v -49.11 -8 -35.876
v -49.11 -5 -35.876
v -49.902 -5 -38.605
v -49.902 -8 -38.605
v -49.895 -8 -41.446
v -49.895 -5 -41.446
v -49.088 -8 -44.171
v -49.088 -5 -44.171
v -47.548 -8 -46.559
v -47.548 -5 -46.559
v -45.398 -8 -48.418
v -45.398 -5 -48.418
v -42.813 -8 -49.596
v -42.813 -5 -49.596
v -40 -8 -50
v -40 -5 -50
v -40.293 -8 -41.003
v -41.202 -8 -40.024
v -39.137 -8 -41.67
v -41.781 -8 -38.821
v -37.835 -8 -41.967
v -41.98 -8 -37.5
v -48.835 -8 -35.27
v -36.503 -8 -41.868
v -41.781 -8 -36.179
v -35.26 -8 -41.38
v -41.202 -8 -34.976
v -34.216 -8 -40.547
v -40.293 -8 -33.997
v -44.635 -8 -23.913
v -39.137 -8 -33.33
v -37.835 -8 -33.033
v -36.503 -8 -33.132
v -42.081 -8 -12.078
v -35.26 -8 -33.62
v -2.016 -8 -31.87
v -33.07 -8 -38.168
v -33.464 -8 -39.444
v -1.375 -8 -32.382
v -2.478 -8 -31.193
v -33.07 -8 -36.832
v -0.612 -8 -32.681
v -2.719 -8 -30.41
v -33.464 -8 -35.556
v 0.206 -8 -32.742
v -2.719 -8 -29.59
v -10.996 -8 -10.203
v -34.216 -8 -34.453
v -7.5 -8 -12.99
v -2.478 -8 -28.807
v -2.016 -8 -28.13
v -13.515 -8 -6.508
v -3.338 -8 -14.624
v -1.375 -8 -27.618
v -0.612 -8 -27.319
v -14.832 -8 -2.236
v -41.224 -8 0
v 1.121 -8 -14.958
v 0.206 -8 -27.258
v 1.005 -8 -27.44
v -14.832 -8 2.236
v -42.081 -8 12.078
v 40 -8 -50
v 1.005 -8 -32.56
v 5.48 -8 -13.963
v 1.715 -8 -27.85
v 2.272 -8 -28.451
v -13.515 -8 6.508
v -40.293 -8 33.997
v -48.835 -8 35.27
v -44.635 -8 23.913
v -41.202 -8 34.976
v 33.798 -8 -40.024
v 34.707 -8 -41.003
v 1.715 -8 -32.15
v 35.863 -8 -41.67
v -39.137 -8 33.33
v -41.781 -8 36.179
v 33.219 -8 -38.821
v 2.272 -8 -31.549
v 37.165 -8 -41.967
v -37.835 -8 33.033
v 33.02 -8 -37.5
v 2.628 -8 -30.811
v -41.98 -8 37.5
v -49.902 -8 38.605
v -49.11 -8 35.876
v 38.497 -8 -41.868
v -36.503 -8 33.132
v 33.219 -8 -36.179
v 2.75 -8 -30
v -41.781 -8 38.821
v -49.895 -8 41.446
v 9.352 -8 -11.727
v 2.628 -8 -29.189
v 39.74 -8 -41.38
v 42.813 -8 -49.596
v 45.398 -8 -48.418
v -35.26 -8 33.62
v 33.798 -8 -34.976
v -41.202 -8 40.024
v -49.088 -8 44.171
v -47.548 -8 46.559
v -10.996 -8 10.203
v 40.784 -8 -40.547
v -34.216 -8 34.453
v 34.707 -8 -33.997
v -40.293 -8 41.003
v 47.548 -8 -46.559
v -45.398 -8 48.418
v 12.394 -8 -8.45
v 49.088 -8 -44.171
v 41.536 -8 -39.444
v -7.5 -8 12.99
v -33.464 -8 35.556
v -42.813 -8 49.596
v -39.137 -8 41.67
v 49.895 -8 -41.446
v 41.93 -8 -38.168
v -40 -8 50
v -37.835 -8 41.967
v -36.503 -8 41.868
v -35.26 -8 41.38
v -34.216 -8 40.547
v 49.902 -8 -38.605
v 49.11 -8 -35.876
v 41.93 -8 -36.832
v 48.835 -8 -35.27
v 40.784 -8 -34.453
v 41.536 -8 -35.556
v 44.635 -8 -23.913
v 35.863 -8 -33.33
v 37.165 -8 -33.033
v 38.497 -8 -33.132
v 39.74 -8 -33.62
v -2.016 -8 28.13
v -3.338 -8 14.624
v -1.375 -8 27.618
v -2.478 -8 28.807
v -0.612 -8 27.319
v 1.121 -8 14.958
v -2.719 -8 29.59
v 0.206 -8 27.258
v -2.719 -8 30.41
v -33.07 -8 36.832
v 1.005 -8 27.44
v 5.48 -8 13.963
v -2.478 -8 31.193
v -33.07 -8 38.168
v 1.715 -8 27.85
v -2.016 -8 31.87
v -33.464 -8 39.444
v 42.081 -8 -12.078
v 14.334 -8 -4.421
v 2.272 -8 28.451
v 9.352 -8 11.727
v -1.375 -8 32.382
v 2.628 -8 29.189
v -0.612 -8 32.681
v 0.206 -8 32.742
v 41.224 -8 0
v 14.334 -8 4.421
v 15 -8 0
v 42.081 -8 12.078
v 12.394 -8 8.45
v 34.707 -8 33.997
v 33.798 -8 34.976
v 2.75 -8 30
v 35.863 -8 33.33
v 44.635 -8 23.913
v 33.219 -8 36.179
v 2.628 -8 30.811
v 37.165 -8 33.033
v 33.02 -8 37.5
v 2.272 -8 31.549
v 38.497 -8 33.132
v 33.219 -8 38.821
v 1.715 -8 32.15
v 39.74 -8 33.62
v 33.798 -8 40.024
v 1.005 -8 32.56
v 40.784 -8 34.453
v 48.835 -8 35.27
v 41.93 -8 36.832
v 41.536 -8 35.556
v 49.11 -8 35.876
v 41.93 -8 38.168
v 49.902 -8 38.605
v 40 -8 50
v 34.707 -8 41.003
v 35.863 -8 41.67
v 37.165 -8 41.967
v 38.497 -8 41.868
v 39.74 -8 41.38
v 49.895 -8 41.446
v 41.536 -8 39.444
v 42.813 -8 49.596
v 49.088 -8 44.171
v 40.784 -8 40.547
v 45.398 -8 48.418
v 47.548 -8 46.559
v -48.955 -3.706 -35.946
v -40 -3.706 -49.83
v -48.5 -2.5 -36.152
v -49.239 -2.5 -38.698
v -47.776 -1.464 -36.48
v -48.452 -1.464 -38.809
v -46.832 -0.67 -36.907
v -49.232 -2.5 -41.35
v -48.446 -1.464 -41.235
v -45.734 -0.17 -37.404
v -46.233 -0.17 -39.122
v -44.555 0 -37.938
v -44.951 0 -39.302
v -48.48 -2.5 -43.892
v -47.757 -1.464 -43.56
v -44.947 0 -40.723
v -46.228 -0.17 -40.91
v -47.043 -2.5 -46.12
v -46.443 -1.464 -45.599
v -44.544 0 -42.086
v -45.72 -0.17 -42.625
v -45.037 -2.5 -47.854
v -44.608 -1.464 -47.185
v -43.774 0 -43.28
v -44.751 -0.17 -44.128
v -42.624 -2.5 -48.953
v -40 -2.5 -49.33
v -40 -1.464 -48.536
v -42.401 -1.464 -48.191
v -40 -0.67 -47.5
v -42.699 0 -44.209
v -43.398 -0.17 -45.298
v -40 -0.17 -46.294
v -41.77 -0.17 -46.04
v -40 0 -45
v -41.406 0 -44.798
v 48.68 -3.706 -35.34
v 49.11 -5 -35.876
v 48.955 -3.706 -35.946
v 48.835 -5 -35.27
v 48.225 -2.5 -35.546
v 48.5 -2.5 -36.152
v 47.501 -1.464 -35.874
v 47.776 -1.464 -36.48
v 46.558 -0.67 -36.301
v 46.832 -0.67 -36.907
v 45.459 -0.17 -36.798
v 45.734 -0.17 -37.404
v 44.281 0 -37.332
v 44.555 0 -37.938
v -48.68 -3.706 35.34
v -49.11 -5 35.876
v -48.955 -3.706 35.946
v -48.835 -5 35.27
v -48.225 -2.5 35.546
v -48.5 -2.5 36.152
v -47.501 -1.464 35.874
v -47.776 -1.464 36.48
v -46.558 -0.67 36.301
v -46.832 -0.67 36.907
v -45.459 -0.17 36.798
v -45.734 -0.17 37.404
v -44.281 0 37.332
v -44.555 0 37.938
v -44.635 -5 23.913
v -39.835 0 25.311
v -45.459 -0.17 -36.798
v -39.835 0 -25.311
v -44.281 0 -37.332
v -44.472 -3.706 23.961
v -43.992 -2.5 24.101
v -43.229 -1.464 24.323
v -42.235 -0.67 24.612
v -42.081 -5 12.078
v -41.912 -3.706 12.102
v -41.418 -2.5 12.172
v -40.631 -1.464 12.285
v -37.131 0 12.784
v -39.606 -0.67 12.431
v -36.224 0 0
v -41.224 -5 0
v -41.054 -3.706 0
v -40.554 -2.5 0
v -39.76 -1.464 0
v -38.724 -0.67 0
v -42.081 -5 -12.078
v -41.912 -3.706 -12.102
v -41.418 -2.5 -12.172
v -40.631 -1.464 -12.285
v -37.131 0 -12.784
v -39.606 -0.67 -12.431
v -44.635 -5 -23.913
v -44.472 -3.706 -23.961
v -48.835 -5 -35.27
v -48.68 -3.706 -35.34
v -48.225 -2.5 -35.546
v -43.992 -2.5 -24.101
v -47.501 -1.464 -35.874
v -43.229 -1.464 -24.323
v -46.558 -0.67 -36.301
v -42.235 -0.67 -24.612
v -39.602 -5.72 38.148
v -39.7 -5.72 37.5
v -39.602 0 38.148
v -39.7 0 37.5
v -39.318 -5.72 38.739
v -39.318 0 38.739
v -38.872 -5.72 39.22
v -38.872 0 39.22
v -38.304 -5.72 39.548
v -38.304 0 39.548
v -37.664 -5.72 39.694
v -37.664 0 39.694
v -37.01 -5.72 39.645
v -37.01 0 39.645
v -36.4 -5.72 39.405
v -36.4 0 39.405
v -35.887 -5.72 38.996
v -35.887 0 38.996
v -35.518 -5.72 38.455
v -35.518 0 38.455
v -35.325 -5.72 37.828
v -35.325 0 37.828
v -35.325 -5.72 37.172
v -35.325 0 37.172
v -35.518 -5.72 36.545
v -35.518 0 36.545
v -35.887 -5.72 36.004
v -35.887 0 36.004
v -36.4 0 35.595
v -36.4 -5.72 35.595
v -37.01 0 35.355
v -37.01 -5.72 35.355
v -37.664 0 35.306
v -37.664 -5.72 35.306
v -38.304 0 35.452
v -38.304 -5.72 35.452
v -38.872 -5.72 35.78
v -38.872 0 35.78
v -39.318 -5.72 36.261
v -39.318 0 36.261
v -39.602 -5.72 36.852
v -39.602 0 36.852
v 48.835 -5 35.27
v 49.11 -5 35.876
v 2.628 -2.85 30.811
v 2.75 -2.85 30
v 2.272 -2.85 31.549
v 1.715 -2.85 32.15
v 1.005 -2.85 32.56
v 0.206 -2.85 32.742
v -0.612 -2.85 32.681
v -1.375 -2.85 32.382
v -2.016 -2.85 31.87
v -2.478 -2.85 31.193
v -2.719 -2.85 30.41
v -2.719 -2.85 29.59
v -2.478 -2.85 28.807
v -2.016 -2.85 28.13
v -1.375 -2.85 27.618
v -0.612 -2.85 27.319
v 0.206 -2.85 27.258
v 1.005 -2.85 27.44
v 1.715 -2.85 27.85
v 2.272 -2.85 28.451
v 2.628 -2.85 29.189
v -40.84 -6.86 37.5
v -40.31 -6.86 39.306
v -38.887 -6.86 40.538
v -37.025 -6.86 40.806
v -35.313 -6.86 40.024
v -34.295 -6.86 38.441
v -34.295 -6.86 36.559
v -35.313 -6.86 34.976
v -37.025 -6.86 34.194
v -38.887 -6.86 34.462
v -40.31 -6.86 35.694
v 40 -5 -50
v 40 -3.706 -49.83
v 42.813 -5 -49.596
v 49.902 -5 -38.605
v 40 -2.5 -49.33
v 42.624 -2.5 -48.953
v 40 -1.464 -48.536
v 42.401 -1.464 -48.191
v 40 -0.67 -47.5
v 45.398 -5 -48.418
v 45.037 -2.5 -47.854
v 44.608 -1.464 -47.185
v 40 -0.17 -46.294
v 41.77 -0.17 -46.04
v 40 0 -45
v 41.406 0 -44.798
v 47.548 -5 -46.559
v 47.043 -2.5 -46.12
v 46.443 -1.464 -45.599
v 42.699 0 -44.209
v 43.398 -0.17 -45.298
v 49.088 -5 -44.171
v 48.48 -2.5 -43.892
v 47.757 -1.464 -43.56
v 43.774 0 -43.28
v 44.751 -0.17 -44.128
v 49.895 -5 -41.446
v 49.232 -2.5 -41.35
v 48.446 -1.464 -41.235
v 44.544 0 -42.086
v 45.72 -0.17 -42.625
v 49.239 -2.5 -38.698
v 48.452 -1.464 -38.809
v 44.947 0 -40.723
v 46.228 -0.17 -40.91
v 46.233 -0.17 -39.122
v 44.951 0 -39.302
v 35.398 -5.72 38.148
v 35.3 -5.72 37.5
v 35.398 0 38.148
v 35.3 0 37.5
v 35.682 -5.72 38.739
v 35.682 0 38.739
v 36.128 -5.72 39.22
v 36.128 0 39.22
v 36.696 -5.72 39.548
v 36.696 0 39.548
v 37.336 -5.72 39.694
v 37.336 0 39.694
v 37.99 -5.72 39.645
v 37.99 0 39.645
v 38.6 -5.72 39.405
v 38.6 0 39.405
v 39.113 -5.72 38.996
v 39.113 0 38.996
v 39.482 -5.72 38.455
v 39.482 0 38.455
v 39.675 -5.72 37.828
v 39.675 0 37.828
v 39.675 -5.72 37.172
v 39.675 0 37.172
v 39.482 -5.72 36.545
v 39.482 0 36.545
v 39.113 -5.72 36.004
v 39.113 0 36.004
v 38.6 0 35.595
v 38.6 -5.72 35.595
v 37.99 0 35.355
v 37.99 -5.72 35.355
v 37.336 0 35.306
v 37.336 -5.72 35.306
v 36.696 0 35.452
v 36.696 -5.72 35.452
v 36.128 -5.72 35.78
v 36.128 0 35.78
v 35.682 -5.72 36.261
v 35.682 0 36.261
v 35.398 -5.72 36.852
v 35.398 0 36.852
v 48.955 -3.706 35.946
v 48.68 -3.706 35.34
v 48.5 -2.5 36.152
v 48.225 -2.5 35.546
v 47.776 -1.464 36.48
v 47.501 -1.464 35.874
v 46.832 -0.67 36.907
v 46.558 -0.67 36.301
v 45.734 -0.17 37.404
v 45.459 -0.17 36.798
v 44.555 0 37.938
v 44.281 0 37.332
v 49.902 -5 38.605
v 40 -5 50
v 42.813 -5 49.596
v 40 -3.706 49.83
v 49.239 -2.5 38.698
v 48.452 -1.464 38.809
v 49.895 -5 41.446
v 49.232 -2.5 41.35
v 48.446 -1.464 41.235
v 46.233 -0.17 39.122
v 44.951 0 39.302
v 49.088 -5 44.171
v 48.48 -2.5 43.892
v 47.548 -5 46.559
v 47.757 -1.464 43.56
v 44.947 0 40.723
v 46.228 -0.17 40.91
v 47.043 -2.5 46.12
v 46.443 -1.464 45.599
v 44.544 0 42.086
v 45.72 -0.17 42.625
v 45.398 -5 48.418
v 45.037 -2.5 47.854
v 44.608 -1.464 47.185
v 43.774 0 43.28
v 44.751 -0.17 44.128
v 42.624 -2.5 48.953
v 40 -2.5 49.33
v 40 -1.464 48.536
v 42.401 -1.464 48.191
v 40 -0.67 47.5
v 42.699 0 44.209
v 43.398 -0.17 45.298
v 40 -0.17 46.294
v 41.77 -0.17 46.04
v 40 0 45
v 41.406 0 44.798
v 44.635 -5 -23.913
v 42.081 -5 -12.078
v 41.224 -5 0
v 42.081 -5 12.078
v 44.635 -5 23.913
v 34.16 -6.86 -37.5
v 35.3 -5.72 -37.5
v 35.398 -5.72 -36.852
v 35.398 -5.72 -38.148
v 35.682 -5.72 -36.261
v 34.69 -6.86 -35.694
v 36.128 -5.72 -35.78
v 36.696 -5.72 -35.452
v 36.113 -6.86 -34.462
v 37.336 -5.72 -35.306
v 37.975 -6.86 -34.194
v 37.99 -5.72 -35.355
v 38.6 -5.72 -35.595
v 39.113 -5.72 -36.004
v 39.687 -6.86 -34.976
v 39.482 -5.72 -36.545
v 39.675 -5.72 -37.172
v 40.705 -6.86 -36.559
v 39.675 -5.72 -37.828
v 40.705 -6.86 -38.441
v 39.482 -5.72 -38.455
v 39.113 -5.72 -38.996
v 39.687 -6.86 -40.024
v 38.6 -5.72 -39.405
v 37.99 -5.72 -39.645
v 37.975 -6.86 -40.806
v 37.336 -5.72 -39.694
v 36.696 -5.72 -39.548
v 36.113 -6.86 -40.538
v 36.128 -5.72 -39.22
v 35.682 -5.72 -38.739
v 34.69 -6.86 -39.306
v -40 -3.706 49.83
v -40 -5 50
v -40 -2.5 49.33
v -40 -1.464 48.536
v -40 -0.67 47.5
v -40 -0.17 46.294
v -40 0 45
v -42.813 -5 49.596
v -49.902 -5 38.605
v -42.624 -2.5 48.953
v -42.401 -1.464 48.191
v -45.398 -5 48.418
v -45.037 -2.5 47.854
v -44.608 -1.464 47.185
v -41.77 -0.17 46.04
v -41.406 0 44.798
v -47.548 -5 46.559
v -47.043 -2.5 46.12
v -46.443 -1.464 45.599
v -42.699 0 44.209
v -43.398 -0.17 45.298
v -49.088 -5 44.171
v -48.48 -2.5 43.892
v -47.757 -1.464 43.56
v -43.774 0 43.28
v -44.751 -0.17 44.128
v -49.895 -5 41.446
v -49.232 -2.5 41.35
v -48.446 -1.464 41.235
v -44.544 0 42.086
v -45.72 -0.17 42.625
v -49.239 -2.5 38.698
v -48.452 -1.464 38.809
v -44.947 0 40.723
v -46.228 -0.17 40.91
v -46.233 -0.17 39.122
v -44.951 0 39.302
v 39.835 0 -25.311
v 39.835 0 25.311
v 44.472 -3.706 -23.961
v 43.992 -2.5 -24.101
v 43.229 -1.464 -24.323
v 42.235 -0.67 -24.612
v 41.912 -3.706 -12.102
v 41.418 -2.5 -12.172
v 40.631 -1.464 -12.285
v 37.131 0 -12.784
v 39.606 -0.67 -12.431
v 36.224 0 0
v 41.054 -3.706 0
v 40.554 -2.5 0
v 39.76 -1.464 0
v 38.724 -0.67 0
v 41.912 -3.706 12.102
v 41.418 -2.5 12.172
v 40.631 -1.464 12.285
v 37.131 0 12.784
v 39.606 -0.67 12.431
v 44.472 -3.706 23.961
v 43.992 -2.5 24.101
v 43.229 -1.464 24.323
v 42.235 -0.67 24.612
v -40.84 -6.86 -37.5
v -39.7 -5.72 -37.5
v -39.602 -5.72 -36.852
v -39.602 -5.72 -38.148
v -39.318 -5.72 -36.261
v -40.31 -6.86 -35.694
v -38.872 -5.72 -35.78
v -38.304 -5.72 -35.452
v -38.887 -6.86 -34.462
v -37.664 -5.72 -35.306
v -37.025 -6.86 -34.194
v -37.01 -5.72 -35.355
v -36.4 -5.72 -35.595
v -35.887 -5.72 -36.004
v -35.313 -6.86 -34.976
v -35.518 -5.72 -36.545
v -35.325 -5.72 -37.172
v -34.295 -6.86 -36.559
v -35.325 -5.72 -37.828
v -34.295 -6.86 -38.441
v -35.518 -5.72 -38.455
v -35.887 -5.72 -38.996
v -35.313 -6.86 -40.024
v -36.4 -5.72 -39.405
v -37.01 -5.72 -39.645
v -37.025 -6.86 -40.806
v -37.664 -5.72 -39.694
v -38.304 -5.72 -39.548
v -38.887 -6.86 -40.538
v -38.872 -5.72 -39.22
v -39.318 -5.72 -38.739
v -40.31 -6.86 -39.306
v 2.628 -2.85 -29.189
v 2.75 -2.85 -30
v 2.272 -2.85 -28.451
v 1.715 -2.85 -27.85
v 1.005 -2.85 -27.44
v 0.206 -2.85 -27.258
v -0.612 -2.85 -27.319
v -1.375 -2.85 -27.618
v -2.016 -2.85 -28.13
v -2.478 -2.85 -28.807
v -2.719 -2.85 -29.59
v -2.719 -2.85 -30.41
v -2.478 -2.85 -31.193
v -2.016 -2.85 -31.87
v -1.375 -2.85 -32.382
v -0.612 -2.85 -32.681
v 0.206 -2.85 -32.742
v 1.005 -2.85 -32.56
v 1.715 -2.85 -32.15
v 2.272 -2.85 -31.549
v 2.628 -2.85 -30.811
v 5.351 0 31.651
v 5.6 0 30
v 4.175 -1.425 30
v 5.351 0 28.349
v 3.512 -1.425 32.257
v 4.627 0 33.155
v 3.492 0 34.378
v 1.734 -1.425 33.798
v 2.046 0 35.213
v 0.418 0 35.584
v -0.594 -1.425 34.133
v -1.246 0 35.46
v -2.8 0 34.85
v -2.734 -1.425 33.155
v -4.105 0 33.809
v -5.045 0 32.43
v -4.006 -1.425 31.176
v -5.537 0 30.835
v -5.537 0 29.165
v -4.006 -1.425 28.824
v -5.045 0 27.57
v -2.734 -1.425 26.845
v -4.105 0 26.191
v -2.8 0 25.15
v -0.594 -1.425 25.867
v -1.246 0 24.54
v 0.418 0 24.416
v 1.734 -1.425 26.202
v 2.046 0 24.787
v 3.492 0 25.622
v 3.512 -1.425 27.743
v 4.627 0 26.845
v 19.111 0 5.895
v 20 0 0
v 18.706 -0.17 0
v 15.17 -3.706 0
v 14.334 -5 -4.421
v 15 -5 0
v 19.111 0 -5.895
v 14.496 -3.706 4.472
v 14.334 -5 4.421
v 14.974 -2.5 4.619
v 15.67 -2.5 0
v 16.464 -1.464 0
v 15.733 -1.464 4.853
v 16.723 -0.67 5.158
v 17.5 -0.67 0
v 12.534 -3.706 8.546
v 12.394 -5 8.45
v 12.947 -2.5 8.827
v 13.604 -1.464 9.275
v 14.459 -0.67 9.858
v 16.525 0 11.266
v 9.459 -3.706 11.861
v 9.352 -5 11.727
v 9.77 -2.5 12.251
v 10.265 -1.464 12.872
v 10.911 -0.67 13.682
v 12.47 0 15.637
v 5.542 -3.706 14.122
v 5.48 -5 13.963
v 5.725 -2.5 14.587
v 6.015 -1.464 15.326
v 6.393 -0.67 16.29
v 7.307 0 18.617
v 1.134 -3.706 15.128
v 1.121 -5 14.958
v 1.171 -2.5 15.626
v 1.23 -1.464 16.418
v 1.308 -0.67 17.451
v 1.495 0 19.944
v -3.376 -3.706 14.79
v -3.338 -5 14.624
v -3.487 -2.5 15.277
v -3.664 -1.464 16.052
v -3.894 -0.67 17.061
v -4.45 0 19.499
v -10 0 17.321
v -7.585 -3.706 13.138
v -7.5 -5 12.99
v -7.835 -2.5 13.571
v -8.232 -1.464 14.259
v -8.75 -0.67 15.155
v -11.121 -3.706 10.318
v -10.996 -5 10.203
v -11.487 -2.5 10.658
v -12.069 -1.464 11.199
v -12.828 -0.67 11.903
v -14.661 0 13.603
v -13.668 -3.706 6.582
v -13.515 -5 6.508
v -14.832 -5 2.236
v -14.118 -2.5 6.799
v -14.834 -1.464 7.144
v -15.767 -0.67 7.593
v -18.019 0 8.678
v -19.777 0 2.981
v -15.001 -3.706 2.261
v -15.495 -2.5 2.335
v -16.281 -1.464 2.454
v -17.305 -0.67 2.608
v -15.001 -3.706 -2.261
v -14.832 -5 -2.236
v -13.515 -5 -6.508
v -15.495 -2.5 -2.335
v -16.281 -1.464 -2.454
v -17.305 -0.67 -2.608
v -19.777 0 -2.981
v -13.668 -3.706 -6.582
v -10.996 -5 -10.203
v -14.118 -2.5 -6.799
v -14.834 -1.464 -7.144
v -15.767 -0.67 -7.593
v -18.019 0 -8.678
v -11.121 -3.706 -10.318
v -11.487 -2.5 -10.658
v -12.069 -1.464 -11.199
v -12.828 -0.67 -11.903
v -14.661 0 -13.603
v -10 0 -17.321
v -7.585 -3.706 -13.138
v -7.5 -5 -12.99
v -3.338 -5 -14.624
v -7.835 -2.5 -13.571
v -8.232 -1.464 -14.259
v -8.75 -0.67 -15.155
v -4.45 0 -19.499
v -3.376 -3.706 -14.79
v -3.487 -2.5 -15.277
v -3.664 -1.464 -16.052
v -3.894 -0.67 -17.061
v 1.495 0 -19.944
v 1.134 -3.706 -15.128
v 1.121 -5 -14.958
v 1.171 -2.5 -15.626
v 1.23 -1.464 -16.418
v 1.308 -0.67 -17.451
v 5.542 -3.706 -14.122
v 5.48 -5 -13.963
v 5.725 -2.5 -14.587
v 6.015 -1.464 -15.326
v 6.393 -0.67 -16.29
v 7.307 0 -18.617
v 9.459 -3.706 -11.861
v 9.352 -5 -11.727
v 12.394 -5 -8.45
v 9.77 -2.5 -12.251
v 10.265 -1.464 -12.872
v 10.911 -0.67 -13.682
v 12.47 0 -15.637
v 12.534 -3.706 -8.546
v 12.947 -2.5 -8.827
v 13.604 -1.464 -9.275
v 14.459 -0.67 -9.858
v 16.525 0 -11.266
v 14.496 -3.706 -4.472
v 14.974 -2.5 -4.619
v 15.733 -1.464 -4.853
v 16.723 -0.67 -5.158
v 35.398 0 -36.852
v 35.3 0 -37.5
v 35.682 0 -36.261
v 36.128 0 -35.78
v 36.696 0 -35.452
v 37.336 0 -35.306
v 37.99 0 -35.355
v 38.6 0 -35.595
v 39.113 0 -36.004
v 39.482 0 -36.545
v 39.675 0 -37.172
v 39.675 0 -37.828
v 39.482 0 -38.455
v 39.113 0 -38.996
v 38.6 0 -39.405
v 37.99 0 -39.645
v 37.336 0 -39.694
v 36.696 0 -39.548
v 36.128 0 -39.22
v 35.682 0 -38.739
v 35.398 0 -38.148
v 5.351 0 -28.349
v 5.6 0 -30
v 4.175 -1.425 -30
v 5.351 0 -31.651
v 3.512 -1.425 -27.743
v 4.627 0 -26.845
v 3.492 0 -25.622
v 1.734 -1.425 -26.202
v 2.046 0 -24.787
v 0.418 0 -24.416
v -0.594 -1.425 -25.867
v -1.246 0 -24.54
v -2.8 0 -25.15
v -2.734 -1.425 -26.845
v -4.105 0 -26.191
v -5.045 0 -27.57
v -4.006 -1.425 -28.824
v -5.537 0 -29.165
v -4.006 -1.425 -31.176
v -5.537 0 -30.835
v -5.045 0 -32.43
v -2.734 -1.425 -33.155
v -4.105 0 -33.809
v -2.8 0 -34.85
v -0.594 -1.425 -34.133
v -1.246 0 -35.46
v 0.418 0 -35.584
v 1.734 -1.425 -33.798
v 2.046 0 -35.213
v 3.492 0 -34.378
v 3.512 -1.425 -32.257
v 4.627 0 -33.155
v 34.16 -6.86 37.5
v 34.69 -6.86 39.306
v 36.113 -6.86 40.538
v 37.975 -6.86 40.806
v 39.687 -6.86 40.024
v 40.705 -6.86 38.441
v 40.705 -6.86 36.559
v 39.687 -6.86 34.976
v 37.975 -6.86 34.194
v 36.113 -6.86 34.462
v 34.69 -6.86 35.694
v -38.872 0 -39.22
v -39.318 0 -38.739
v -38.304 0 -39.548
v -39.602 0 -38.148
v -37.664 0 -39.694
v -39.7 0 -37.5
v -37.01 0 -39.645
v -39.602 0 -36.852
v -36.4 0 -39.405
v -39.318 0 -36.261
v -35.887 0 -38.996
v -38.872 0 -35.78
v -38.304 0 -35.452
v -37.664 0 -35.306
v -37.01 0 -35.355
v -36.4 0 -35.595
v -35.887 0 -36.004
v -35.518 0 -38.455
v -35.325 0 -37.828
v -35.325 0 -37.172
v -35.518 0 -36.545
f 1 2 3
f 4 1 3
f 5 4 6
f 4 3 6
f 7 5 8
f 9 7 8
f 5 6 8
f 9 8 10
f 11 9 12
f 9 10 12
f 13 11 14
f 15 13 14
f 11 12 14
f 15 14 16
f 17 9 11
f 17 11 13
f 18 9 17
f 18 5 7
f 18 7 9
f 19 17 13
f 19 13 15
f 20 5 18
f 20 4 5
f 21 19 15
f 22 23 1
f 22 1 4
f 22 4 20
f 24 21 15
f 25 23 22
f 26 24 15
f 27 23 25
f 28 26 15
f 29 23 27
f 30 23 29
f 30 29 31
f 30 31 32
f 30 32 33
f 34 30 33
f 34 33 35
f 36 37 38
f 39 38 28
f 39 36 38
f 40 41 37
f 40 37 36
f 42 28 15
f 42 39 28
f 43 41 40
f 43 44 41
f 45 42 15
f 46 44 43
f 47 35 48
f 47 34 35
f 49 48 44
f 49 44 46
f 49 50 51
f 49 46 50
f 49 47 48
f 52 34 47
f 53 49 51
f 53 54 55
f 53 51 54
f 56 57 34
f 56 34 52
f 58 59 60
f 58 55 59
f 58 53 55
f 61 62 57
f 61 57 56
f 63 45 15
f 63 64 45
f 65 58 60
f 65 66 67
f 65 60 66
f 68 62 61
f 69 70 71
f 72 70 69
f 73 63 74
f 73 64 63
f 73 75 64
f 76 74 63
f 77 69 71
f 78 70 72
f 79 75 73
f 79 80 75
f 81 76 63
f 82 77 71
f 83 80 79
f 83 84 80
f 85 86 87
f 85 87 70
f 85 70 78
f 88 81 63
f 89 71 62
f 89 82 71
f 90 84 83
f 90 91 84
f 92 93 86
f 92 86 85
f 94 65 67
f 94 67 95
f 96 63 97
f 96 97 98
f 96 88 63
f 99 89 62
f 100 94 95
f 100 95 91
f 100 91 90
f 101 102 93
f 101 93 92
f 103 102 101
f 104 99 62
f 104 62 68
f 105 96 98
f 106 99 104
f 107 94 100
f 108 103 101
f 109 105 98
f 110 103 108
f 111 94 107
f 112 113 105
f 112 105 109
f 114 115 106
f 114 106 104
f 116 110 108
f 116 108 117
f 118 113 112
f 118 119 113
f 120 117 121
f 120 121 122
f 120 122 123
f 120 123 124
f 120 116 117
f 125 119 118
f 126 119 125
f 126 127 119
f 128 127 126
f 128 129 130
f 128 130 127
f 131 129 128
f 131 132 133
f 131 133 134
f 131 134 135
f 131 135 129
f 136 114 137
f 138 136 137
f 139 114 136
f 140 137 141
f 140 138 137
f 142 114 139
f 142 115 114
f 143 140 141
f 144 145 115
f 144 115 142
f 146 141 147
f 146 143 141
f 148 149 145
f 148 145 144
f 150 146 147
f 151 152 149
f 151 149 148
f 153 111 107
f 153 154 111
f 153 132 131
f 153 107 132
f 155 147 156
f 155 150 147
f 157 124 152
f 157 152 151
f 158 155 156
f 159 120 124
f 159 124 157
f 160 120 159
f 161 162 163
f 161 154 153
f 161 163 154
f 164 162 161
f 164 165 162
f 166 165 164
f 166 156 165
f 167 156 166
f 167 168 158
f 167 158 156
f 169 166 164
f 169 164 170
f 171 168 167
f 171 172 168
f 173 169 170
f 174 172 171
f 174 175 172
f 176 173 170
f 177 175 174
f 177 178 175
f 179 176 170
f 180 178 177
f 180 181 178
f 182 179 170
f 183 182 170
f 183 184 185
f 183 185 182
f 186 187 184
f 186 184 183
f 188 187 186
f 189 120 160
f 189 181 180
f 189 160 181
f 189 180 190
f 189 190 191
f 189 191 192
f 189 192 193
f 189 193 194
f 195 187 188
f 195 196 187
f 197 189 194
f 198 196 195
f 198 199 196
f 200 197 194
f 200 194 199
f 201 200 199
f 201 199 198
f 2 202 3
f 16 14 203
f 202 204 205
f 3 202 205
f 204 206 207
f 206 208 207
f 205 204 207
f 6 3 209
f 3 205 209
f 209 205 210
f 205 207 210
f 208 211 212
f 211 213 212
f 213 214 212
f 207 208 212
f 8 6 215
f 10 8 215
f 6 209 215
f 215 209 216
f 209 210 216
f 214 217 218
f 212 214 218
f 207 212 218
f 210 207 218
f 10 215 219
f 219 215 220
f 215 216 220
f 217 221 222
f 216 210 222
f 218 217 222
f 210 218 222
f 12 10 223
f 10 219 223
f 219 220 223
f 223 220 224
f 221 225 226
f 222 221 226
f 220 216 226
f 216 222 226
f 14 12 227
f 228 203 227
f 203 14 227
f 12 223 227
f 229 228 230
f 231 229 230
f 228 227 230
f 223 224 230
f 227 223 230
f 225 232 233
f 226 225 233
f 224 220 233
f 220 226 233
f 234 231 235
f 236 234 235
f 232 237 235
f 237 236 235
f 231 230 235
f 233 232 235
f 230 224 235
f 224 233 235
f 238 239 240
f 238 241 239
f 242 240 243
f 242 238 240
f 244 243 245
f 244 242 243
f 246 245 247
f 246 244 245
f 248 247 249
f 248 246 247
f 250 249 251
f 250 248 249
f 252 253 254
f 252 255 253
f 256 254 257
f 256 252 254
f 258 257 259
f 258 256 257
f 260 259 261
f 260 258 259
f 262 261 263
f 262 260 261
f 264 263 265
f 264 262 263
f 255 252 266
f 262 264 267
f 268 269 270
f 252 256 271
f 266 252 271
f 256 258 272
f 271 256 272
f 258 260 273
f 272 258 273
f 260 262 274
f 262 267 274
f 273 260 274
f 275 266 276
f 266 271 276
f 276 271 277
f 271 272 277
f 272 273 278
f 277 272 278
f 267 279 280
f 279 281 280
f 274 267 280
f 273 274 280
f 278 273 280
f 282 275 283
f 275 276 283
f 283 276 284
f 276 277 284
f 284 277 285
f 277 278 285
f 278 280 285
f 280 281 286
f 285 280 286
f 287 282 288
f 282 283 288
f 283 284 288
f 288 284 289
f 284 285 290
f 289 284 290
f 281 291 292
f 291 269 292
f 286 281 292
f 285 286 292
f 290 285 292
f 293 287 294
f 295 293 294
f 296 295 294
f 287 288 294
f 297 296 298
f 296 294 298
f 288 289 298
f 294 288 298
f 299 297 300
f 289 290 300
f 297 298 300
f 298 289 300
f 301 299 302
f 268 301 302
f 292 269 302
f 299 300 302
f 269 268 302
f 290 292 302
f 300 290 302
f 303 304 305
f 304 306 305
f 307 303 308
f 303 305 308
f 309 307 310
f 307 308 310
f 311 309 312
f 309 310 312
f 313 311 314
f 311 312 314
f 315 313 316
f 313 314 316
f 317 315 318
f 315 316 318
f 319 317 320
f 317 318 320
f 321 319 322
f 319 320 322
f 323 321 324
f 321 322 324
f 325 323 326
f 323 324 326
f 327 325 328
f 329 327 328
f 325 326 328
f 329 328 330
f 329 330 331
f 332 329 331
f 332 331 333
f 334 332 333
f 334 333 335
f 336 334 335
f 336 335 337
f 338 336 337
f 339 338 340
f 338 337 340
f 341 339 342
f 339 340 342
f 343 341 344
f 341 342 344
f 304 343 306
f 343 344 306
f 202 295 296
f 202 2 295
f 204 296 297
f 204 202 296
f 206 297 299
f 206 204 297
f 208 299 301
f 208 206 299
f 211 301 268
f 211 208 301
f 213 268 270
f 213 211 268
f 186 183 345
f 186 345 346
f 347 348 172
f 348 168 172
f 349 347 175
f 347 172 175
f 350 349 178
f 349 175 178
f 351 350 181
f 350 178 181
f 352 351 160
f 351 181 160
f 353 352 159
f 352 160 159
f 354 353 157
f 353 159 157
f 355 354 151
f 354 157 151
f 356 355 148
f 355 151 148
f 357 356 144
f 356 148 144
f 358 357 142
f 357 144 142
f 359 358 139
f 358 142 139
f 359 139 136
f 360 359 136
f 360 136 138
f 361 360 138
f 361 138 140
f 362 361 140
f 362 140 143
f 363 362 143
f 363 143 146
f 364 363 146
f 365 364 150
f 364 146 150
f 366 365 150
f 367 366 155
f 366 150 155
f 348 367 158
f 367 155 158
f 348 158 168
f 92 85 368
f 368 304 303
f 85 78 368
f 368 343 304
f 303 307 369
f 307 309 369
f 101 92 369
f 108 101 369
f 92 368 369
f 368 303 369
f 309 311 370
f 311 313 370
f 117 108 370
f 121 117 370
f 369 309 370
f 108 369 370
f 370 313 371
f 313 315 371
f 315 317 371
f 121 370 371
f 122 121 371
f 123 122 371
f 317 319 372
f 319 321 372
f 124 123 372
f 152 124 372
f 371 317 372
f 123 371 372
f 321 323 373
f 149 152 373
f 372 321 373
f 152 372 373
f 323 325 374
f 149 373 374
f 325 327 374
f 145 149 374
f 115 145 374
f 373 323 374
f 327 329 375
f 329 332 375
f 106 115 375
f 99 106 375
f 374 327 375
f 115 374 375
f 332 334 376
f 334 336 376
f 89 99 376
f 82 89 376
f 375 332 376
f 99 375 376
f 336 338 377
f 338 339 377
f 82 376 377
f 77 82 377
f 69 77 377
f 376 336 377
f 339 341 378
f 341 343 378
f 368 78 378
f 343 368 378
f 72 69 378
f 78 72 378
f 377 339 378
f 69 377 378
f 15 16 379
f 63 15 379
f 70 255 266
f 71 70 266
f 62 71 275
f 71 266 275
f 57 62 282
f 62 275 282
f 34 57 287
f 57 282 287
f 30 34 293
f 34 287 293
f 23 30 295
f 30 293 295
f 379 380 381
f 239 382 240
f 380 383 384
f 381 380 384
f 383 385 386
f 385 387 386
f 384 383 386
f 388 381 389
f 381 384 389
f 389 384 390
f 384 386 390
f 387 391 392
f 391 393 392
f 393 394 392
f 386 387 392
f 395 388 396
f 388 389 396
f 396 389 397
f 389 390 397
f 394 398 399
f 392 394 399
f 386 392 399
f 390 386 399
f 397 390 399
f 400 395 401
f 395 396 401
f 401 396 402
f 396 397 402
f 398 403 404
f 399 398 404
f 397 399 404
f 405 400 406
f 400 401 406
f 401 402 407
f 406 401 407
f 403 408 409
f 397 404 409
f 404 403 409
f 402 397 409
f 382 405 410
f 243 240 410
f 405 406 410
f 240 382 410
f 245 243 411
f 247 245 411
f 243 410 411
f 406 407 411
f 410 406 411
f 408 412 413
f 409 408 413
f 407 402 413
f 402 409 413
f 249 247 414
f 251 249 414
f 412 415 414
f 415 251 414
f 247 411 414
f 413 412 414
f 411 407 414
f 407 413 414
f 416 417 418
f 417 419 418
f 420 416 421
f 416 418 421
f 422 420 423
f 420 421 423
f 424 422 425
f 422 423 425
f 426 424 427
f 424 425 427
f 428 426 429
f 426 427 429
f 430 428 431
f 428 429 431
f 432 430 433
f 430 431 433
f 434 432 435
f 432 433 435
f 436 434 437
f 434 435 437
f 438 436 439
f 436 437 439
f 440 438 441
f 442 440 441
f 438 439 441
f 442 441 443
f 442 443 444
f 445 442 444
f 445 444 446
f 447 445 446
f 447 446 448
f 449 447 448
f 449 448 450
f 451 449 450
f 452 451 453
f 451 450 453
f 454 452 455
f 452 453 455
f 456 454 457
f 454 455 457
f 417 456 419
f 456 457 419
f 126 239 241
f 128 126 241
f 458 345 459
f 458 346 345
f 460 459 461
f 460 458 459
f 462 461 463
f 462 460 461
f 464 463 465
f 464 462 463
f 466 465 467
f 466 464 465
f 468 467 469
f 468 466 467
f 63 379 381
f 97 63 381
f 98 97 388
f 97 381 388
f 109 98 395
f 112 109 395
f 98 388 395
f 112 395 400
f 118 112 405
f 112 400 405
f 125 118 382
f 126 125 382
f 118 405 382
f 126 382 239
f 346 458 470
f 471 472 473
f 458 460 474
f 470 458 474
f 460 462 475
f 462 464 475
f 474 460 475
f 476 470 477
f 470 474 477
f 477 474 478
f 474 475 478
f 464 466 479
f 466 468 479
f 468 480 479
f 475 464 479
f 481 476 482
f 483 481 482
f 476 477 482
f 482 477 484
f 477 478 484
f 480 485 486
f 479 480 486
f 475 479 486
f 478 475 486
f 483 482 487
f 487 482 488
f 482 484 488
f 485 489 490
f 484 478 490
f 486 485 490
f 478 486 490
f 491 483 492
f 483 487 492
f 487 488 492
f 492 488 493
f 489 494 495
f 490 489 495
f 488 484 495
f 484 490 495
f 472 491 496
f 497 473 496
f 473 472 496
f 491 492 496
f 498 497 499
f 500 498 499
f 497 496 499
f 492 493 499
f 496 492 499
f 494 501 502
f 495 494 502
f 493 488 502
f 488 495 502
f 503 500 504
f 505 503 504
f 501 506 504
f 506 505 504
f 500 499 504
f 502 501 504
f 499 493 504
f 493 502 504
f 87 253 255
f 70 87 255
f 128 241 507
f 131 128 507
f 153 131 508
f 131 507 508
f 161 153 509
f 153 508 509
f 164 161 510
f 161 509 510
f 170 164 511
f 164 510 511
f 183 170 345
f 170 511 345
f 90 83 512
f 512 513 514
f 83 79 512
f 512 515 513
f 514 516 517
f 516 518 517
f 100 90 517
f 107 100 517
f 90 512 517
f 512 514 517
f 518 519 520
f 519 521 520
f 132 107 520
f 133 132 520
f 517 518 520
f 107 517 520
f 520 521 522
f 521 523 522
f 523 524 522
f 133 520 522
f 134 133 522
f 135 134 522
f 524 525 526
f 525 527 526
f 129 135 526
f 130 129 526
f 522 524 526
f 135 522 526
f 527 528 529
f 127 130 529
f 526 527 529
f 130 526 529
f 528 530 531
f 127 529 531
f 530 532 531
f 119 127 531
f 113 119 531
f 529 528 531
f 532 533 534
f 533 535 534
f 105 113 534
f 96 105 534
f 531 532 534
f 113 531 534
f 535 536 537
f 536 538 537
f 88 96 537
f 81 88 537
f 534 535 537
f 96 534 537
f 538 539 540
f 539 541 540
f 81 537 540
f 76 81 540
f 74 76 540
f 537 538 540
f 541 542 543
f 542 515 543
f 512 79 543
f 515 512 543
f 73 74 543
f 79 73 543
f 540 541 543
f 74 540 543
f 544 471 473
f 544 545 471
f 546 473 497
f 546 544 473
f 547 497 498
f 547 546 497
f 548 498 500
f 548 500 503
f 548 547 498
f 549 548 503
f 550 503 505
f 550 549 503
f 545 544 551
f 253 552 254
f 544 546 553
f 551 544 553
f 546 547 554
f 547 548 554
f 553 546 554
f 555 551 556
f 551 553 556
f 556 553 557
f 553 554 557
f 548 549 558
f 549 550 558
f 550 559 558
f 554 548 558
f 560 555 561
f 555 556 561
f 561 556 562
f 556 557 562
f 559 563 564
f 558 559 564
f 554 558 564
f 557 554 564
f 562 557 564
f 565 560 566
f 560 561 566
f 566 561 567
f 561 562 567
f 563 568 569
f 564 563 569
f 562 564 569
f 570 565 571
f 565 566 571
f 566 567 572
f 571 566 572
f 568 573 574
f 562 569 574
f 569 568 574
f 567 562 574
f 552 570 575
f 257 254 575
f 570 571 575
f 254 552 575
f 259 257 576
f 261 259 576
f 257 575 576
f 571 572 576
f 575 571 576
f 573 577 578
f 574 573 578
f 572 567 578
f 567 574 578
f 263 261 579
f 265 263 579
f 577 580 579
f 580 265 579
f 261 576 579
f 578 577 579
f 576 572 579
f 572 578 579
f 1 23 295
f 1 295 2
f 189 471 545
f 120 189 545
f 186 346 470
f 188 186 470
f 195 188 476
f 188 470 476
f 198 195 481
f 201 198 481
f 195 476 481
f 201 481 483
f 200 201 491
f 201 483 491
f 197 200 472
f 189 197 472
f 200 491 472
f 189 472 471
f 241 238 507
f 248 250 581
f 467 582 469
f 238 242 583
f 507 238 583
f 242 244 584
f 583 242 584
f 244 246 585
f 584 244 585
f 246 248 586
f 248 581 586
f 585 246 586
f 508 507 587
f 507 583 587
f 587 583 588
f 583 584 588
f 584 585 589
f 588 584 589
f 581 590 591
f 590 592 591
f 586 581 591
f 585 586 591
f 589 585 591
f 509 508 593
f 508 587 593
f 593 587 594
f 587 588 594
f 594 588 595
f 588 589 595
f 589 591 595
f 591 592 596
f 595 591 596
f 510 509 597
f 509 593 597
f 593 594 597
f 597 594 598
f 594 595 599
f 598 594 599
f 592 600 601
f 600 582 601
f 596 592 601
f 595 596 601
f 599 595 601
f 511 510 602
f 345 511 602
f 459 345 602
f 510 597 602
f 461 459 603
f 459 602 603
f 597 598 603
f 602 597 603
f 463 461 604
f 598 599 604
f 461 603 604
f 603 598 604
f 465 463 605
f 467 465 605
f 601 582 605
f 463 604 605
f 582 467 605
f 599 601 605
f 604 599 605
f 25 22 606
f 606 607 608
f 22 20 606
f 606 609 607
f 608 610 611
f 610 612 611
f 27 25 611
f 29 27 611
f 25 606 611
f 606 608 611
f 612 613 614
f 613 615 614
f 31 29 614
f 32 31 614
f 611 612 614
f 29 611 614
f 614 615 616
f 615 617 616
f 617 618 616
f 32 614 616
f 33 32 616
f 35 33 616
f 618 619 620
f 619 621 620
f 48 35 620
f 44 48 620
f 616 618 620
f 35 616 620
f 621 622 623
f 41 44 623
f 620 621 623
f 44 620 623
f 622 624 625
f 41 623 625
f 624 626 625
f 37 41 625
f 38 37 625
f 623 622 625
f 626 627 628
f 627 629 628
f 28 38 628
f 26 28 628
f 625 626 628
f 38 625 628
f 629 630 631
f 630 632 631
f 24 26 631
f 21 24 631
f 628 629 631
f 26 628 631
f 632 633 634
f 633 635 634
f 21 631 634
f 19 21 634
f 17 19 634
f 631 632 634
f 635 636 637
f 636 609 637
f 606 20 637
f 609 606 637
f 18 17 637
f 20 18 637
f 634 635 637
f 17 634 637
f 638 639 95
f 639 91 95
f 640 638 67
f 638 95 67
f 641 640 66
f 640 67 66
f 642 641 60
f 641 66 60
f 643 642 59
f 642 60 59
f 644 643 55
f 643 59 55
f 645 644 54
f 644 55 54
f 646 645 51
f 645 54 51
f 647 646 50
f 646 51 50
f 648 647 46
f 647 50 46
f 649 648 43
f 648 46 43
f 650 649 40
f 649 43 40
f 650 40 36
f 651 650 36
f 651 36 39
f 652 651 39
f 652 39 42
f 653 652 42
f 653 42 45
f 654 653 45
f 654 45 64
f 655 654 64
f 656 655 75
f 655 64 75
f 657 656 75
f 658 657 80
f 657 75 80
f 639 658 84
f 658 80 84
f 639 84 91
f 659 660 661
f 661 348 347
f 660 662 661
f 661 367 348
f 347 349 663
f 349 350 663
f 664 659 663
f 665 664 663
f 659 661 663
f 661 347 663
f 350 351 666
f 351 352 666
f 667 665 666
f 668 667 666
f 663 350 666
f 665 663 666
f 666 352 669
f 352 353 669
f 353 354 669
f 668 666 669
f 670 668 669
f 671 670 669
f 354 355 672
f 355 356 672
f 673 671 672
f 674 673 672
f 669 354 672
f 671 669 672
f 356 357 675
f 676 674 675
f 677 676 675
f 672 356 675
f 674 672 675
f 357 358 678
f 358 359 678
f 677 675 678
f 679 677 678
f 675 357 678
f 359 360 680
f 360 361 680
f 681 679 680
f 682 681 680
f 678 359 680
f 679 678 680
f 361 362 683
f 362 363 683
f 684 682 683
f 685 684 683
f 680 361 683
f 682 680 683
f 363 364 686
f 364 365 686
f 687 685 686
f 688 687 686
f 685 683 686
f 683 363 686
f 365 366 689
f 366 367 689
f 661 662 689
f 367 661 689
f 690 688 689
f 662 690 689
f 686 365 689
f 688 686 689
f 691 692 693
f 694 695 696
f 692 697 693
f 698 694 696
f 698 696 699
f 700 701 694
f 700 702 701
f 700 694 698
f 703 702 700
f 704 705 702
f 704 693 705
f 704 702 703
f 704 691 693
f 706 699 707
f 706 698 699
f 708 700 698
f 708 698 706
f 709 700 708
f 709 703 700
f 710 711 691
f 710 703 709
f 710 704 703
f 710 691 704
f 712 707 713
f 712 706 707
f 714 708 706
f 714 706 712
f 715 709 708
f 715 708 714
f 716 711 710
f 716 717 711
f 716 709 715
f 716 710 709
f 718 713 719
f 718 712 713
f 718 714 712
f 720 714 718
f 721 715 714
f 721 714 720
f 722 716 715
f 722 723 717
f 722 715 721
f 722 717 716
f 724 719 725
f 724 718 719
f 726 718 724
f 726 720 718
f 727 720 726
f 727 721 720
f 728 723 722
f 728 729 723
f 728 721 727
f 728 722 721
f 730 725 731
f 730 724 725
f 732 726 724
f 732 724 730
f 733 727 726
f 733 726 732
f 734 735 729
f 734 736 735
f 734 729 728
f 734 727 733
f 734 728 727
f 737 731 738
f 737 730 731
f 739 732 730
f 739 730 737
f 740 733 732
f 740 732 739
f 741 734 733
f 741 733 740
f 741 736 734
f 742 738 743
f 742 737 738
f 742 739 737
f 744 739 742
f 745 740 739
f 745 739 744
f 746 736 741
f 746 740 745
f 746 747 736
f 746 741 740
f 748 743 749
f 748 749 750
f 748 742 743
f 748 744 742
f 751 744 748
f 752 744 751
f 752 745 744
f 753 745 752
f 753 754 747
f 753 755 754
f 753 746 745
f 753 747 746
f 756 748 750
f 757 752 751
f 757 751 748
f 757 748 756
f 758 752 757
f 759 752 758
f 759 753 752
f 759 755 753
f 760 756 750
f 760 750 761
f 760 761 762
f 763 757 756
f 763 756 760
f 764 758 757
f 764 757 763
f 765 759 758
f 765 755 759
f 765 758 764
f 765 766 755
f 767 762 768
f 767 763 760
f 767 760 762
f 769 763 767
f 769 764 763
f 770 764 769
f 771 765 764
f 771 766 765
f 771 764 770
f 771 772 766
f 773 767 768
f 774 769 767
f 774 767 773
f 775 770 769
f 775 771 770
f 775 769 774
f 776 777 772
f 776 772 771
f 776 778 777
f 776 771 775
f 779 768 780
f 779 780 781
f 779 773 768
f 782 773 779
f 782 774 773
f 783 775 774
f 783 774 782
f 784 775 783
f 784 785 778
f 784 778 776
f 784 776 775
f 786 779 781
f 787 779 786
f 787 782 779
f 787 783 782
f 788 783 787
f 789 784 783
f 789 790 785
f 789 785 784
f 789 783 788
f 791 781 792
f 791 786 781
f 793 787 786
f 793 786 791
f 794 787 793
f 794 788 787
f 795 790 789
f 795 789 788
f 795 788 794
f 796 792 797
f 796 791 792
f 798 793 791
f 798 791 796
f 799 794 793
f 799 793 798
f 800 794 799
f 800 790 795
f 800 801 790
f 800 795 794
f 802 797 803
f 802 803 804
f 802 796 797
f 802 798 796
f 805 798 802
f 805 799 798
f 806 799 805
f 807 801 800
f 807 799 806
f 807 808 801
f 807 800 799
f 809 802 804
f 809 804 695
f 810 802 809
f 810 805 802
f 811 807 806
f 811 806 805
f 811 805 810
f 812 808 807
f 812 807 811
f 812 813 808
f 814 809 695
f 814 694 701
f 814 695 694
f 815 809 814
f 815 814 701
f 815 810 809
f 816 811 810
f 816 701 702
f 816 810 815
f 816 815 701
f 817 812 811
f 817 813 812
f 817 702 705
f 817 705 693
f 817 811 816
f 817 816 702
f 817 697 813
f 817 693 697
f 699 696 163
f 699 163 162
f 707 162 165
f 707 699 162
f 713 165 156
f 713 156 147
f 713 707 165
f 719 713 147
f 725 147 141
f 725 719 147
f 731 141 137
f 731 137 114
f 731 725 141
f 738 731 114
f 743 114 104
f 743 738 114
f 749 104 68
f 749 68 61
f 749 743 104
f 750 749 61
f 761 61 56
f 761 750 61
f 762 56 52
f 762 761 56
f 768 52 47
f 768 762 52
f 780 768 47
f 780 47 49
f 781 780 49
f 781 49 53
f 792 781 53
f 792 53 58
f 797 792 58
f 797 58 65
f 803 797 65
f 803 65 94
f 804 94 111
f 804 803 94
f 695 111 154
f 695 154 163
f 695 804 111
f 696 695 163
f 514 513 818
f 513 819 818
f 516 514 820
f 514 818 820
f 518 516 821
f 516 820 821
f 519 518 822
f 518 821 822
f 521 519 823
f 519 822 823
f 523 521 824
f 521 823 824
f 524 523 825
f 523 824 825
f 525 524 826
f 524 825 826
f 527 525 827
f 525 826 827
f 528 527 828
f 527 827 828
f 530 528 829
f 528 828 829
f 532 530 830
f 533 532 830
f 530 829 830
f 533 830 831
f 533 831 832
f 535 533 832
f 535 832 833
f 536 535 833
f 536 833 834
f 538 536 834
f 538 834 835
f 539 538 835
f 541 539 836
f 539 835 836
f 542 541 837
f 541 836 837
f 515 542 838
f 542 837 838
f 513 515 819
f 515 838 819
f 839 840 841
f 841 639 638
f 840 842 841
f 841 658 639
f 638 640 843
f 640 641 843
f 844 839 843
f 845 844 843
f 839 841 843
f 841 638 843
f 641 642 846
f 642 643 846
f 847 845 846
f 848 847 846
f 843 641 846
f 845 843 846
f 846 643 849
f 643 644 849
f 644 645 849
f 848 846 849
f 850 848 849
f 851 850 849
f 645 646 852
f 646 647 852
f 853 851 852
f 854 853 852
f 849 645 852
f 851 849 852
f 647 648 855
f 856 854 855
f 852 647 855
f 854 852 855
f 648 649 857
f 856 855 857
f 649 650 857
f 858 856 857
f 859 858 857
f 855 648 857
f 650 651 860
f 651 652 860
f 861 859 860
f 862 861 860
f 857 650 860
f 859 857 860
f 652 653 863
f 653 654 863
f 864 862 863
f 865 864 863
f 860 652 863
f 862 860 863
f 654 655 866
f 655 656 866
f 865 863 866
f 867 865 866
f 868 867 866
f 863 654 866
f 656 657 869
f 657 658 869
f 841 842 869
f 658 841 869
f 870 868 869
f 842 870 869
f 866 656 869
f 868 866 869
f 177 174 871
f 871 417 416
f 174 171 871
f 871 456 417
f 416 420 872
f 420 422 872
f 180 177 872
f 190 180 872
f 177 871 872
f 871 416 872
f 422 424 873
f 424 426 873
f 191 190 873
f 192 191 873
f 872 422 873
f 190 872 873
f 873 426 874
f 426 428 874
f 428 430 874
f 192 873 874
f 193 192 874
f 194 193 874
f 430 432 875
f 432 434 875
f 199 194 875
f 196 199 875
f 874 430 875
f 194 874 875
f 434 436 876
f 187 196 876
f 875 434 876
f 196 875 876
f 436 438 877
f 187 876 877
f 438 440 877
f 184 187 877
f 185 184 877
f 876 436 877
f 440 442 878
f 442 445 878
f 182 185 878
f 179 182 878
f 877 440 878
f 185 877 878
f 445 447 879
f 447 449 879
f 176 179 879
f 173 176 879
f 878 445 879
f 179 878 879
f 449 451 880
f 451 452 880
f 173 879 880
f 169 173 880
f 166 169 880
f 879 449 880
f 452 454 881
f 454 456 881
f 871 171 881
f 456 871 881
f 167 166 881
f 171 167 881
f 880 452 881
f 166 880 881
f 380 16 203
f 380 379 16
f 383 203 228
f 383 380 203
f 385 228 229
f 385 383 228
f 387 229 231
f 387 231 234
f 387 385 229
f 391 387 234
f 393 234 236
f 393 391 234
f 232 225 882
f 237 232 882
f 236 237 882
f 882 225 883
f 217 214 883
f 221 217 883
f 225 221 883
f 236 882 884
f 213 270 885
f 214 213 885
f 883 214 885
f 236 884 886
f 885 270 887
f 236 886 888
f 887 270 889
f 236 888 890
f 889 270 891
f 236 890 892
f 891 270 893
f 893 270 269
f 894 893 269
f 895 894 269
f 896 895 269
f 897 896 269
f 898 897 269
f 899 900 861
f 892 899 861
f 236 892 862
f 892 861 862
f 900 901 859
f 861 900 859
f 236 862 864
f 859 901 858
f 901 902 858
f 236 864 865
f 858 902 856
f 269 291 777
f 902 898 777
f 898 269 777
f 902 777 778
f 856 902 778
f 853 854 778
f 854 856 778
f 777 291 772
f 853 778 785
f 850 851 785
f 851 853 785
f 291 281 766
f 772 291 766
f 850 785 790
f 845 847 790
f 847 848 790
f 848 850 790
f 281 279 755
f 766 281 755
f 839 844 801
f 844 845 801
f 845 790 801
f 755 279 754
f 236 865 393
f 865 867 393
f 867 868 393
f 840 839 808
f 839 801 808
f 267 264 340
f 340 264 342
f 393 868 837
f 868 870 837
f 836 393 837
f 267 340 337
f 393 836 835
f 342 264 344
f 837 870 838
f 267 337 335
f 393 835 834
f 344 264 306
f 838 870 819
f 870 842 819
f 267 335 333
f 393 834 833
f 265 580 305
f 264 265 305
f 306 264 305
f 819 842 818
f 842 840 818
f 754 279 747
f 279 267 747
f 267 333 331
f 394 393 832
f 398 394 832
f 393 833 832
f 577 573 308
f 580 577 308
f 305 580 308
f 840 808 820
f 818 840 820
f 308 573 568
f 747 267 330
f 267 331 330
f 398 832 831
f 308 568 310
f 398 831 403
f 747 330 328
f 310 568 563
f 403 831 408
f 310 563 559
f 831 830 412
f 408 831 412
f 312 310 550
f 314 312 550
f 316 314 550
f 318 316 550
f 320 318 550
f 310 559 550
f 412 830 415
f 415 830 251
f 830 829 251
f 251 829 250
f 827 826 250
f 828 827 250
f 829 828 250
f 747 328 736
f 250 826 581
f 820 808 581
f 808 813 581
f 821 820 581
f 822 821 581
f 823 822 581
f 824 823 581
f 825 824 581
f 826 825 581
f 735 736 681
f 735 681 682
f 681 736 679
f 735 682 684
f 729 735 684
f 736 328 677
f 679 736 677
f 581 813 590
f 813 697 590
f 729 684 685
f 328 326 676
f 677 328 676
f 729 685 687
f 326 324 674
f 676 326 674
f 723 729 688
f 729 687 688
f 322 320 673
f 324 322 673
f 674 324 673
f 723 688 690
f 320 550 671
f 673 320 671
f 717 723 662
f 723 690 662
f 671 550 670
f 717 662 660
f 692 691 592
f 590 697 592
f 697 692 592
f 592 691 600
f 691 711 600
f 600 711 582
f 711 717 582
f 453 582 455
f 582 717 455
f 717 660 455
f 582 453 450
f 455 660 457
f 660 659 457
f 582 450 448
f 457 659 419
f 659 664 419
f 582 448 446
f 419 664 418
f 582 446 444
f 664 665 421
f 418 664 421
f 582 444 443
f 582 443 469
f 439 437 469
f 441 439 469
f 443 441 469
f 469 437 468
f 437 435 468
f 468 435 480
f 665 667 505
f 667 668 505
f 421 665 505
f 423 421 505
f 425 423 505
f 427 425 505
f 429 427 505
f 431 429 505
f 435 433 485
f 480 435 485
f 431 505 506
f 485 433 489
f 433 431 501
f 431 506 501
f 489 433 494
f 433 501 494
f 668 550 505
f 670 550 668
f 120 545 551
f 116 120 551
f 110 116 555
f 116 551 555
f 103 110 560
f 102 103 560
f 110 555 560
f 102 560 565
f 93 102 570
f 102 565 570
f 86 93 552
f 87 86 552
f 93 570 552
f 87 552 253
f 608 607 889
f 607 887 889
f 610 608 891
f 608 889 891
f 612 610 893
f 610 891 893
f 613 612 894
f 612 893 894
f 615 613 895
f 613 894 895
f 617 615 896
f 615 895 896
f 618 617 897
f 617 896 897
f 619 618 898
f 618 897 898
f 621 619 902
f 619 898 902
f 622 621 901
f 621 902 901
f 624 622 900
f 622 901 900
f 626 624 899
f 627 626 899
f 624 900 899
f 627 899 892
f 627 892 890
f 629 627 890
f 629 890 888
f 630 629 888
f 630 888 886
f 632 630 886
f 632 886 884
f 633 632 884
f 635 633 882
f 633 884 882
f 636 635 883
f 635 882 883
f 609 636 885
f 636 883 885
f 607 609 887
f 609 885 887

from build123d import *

# Parameters (mm, degrees)
F0_R           = 15
F1_DEPTH       = 8
F3_D           = 4.4
F3_START       = 2
F3_CSINK_D     = 8.96
F3_CSINK_ANGLE = 90
F5_D           = 5.5
F5_CSINK_D     = 11.2
F5_CSINK_ANGLE = 90
F6_R           = 5


# Not quite as in the source:
# - a feature names something its author has since deleted; it is built from what else it names


with BuildPart() as f1:
    # F0 (on Front) → F1 (new body)
    with BuildSketch(Plane.XZ):
        with BuildLine():
            Line((40, 50), (-40, 50))
            ThreePointArc((-40, 50), (-48.4035993498, 45.4202876277), (-49.1099851169, 35.8759035935))
            Line((-49.1099851169, 35.8759035935), (-48.8354949074, 35.2695642948))
            ThreePointArc((-48.8354949074, 35.2695642948), (-41.2240246484, 0), (-48.8354949074, -35.2695642948))
            Line((-48.8354949074, -35.2695642948), (-49.1099851169, -35.8759035935))
            ThreePointArc((-49.1099851169, -35.8759035935), (-48.4035993498, -45.4202876277), (-40, -50))
            Line((-40, -50), (40, -50))
            ThreePointArc((40, -50), (48.4035993498, -45.4202876277), (49.1099851169, -35.8759035935))
            Line((49.1099851169, -35.8759035935), (48.8354949074, -35.2695642948))
            ThreePointArc((48.8354949074, -35.2695642948), (41.2240246484, 0), (48.8354949074, 35.2695642948))
            Line((48.8354949074, 35.2695642948), (49.1099851169, 35.8759035935))
            ThreePointArc((49.1099851169, 35.8759035935), (48.4035993498, 45.4202876277), (40, 50))
        make_face()
        Circle(F0_R, mode=Mode.SUBTRACT)
    extrude(amount=F1_DEPTH)

    # F3 (through all)
    # its depths count from where the whole tool has entered the part; down to there all is cleared
    with Locations(Plane.XZ.offset(10).offset(-F3_START)):
        with Locations((-37.5, 37.5), (37.5, 37.5), (37.5, -37.5), (-37.5, -37.5)):
            CounterSinkHole(F3_D / 2, F3_CSINK_D / 2, counter_sink_angle=F3_CSINK_ANGLE)

    # F5 (through all)
    with Locations(Plane(origin=(0, 0, 0), x_dir=(-1, 0, 0), z_dir=(0, 1, 0))):
        with Locations((0, -30), (0, 30)):
            CounterSinkHole(F5_D / 2, F5_CSINK_D / 2, counter_sink_angle=F5_CSINK_ANGLE)

    # F6
    f6_edges = [f1.edges().sort_by_distance(p)[0] for p in [
        (0, 0, 50),
        (-15, 0, 0),
    ]]
    fillet(f6_edges, radius=F6_R)


solid = f1.part
